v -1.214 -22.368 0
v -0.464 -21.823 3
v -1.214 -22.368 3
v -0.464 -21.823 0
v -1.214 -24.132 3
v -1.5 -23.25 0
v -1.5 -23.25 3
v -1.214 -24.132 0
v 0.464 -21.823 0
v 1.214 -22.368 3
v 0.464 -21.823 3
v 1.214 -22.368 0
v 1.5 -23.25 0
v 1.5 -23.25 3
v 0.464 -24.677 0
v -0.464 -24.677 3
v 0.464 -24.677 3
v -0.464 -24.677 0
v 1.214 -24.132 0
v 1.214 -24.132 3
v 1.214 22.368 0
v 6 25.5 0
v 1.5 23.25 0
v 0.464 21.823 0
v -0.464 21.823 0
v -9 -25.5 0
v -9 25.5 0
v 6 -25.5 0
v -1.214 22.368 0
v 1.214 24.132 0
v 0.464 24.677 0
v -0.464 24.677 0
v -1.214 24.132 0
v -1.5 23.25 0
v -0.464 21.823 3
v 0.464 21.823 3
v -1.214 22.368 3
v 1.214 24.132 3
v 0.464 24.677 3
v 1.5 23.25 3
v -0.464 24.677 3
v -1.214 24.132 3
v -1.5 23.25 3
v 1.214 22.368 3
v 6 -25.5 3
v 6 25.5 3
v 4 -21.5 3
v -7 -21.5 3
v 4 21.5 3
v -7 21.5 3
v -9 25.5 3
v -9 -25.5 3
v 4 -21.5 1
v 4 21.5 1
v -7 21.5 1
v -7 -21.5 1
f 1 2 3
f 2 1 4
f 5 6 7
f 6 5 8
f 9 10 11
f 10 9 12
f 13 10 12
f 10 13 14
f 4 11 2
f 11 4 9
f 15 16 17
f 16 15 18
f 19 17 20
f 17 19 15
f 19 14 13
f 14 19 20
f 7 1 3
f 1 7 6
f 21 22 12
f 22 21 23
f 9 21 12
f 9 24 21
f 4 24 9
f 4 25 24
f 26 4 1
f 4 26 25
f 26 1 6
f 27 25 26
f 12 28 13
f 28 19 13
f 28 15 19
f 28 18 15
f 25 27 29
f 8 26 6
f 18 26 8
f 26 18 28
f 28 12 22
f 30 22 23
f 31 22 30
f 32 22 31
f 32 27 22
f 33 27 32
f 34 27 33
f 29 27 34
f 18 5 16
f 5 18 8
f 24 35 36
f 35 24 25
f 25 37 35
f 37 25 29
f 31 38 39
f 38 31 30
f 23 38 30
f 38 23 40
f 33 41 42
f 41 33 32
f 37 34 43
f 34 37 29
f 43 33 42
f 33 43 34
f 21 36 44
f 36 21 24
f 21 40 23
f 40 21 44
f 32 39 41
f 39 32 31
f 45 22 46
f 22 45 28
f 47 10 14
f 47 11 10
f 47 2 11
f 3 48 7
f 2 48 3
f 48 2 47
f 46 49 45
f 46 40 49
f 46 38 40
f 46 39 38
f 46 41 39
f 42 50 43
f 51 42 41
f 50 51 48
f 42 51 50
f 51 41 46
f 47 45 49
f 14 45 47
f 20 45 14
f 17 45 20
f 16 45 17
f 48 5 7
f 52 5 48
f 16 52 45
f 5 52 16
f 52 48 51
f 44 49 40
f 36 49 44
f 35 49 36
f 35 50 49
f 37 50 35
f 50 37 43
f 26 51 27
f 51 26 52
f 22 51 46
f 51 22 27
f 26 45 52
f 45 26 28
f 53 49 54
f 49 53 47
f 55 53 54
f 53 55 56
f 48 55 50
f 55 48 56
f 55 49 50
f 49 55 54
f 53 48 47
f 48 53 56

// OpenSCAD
difference(){
	translate([-9,-25.5,0])cube([15,51,3]);
	union(){
		translate([0,-23.25,0])cylinder(r=3/2,h=10, $fn=10);
		translate([0,23.25,0])cylinder(r=3/2,h=10, $fn=10);
	}
	translate([-7,-21.5,1])cube([11,43,3]);
}
